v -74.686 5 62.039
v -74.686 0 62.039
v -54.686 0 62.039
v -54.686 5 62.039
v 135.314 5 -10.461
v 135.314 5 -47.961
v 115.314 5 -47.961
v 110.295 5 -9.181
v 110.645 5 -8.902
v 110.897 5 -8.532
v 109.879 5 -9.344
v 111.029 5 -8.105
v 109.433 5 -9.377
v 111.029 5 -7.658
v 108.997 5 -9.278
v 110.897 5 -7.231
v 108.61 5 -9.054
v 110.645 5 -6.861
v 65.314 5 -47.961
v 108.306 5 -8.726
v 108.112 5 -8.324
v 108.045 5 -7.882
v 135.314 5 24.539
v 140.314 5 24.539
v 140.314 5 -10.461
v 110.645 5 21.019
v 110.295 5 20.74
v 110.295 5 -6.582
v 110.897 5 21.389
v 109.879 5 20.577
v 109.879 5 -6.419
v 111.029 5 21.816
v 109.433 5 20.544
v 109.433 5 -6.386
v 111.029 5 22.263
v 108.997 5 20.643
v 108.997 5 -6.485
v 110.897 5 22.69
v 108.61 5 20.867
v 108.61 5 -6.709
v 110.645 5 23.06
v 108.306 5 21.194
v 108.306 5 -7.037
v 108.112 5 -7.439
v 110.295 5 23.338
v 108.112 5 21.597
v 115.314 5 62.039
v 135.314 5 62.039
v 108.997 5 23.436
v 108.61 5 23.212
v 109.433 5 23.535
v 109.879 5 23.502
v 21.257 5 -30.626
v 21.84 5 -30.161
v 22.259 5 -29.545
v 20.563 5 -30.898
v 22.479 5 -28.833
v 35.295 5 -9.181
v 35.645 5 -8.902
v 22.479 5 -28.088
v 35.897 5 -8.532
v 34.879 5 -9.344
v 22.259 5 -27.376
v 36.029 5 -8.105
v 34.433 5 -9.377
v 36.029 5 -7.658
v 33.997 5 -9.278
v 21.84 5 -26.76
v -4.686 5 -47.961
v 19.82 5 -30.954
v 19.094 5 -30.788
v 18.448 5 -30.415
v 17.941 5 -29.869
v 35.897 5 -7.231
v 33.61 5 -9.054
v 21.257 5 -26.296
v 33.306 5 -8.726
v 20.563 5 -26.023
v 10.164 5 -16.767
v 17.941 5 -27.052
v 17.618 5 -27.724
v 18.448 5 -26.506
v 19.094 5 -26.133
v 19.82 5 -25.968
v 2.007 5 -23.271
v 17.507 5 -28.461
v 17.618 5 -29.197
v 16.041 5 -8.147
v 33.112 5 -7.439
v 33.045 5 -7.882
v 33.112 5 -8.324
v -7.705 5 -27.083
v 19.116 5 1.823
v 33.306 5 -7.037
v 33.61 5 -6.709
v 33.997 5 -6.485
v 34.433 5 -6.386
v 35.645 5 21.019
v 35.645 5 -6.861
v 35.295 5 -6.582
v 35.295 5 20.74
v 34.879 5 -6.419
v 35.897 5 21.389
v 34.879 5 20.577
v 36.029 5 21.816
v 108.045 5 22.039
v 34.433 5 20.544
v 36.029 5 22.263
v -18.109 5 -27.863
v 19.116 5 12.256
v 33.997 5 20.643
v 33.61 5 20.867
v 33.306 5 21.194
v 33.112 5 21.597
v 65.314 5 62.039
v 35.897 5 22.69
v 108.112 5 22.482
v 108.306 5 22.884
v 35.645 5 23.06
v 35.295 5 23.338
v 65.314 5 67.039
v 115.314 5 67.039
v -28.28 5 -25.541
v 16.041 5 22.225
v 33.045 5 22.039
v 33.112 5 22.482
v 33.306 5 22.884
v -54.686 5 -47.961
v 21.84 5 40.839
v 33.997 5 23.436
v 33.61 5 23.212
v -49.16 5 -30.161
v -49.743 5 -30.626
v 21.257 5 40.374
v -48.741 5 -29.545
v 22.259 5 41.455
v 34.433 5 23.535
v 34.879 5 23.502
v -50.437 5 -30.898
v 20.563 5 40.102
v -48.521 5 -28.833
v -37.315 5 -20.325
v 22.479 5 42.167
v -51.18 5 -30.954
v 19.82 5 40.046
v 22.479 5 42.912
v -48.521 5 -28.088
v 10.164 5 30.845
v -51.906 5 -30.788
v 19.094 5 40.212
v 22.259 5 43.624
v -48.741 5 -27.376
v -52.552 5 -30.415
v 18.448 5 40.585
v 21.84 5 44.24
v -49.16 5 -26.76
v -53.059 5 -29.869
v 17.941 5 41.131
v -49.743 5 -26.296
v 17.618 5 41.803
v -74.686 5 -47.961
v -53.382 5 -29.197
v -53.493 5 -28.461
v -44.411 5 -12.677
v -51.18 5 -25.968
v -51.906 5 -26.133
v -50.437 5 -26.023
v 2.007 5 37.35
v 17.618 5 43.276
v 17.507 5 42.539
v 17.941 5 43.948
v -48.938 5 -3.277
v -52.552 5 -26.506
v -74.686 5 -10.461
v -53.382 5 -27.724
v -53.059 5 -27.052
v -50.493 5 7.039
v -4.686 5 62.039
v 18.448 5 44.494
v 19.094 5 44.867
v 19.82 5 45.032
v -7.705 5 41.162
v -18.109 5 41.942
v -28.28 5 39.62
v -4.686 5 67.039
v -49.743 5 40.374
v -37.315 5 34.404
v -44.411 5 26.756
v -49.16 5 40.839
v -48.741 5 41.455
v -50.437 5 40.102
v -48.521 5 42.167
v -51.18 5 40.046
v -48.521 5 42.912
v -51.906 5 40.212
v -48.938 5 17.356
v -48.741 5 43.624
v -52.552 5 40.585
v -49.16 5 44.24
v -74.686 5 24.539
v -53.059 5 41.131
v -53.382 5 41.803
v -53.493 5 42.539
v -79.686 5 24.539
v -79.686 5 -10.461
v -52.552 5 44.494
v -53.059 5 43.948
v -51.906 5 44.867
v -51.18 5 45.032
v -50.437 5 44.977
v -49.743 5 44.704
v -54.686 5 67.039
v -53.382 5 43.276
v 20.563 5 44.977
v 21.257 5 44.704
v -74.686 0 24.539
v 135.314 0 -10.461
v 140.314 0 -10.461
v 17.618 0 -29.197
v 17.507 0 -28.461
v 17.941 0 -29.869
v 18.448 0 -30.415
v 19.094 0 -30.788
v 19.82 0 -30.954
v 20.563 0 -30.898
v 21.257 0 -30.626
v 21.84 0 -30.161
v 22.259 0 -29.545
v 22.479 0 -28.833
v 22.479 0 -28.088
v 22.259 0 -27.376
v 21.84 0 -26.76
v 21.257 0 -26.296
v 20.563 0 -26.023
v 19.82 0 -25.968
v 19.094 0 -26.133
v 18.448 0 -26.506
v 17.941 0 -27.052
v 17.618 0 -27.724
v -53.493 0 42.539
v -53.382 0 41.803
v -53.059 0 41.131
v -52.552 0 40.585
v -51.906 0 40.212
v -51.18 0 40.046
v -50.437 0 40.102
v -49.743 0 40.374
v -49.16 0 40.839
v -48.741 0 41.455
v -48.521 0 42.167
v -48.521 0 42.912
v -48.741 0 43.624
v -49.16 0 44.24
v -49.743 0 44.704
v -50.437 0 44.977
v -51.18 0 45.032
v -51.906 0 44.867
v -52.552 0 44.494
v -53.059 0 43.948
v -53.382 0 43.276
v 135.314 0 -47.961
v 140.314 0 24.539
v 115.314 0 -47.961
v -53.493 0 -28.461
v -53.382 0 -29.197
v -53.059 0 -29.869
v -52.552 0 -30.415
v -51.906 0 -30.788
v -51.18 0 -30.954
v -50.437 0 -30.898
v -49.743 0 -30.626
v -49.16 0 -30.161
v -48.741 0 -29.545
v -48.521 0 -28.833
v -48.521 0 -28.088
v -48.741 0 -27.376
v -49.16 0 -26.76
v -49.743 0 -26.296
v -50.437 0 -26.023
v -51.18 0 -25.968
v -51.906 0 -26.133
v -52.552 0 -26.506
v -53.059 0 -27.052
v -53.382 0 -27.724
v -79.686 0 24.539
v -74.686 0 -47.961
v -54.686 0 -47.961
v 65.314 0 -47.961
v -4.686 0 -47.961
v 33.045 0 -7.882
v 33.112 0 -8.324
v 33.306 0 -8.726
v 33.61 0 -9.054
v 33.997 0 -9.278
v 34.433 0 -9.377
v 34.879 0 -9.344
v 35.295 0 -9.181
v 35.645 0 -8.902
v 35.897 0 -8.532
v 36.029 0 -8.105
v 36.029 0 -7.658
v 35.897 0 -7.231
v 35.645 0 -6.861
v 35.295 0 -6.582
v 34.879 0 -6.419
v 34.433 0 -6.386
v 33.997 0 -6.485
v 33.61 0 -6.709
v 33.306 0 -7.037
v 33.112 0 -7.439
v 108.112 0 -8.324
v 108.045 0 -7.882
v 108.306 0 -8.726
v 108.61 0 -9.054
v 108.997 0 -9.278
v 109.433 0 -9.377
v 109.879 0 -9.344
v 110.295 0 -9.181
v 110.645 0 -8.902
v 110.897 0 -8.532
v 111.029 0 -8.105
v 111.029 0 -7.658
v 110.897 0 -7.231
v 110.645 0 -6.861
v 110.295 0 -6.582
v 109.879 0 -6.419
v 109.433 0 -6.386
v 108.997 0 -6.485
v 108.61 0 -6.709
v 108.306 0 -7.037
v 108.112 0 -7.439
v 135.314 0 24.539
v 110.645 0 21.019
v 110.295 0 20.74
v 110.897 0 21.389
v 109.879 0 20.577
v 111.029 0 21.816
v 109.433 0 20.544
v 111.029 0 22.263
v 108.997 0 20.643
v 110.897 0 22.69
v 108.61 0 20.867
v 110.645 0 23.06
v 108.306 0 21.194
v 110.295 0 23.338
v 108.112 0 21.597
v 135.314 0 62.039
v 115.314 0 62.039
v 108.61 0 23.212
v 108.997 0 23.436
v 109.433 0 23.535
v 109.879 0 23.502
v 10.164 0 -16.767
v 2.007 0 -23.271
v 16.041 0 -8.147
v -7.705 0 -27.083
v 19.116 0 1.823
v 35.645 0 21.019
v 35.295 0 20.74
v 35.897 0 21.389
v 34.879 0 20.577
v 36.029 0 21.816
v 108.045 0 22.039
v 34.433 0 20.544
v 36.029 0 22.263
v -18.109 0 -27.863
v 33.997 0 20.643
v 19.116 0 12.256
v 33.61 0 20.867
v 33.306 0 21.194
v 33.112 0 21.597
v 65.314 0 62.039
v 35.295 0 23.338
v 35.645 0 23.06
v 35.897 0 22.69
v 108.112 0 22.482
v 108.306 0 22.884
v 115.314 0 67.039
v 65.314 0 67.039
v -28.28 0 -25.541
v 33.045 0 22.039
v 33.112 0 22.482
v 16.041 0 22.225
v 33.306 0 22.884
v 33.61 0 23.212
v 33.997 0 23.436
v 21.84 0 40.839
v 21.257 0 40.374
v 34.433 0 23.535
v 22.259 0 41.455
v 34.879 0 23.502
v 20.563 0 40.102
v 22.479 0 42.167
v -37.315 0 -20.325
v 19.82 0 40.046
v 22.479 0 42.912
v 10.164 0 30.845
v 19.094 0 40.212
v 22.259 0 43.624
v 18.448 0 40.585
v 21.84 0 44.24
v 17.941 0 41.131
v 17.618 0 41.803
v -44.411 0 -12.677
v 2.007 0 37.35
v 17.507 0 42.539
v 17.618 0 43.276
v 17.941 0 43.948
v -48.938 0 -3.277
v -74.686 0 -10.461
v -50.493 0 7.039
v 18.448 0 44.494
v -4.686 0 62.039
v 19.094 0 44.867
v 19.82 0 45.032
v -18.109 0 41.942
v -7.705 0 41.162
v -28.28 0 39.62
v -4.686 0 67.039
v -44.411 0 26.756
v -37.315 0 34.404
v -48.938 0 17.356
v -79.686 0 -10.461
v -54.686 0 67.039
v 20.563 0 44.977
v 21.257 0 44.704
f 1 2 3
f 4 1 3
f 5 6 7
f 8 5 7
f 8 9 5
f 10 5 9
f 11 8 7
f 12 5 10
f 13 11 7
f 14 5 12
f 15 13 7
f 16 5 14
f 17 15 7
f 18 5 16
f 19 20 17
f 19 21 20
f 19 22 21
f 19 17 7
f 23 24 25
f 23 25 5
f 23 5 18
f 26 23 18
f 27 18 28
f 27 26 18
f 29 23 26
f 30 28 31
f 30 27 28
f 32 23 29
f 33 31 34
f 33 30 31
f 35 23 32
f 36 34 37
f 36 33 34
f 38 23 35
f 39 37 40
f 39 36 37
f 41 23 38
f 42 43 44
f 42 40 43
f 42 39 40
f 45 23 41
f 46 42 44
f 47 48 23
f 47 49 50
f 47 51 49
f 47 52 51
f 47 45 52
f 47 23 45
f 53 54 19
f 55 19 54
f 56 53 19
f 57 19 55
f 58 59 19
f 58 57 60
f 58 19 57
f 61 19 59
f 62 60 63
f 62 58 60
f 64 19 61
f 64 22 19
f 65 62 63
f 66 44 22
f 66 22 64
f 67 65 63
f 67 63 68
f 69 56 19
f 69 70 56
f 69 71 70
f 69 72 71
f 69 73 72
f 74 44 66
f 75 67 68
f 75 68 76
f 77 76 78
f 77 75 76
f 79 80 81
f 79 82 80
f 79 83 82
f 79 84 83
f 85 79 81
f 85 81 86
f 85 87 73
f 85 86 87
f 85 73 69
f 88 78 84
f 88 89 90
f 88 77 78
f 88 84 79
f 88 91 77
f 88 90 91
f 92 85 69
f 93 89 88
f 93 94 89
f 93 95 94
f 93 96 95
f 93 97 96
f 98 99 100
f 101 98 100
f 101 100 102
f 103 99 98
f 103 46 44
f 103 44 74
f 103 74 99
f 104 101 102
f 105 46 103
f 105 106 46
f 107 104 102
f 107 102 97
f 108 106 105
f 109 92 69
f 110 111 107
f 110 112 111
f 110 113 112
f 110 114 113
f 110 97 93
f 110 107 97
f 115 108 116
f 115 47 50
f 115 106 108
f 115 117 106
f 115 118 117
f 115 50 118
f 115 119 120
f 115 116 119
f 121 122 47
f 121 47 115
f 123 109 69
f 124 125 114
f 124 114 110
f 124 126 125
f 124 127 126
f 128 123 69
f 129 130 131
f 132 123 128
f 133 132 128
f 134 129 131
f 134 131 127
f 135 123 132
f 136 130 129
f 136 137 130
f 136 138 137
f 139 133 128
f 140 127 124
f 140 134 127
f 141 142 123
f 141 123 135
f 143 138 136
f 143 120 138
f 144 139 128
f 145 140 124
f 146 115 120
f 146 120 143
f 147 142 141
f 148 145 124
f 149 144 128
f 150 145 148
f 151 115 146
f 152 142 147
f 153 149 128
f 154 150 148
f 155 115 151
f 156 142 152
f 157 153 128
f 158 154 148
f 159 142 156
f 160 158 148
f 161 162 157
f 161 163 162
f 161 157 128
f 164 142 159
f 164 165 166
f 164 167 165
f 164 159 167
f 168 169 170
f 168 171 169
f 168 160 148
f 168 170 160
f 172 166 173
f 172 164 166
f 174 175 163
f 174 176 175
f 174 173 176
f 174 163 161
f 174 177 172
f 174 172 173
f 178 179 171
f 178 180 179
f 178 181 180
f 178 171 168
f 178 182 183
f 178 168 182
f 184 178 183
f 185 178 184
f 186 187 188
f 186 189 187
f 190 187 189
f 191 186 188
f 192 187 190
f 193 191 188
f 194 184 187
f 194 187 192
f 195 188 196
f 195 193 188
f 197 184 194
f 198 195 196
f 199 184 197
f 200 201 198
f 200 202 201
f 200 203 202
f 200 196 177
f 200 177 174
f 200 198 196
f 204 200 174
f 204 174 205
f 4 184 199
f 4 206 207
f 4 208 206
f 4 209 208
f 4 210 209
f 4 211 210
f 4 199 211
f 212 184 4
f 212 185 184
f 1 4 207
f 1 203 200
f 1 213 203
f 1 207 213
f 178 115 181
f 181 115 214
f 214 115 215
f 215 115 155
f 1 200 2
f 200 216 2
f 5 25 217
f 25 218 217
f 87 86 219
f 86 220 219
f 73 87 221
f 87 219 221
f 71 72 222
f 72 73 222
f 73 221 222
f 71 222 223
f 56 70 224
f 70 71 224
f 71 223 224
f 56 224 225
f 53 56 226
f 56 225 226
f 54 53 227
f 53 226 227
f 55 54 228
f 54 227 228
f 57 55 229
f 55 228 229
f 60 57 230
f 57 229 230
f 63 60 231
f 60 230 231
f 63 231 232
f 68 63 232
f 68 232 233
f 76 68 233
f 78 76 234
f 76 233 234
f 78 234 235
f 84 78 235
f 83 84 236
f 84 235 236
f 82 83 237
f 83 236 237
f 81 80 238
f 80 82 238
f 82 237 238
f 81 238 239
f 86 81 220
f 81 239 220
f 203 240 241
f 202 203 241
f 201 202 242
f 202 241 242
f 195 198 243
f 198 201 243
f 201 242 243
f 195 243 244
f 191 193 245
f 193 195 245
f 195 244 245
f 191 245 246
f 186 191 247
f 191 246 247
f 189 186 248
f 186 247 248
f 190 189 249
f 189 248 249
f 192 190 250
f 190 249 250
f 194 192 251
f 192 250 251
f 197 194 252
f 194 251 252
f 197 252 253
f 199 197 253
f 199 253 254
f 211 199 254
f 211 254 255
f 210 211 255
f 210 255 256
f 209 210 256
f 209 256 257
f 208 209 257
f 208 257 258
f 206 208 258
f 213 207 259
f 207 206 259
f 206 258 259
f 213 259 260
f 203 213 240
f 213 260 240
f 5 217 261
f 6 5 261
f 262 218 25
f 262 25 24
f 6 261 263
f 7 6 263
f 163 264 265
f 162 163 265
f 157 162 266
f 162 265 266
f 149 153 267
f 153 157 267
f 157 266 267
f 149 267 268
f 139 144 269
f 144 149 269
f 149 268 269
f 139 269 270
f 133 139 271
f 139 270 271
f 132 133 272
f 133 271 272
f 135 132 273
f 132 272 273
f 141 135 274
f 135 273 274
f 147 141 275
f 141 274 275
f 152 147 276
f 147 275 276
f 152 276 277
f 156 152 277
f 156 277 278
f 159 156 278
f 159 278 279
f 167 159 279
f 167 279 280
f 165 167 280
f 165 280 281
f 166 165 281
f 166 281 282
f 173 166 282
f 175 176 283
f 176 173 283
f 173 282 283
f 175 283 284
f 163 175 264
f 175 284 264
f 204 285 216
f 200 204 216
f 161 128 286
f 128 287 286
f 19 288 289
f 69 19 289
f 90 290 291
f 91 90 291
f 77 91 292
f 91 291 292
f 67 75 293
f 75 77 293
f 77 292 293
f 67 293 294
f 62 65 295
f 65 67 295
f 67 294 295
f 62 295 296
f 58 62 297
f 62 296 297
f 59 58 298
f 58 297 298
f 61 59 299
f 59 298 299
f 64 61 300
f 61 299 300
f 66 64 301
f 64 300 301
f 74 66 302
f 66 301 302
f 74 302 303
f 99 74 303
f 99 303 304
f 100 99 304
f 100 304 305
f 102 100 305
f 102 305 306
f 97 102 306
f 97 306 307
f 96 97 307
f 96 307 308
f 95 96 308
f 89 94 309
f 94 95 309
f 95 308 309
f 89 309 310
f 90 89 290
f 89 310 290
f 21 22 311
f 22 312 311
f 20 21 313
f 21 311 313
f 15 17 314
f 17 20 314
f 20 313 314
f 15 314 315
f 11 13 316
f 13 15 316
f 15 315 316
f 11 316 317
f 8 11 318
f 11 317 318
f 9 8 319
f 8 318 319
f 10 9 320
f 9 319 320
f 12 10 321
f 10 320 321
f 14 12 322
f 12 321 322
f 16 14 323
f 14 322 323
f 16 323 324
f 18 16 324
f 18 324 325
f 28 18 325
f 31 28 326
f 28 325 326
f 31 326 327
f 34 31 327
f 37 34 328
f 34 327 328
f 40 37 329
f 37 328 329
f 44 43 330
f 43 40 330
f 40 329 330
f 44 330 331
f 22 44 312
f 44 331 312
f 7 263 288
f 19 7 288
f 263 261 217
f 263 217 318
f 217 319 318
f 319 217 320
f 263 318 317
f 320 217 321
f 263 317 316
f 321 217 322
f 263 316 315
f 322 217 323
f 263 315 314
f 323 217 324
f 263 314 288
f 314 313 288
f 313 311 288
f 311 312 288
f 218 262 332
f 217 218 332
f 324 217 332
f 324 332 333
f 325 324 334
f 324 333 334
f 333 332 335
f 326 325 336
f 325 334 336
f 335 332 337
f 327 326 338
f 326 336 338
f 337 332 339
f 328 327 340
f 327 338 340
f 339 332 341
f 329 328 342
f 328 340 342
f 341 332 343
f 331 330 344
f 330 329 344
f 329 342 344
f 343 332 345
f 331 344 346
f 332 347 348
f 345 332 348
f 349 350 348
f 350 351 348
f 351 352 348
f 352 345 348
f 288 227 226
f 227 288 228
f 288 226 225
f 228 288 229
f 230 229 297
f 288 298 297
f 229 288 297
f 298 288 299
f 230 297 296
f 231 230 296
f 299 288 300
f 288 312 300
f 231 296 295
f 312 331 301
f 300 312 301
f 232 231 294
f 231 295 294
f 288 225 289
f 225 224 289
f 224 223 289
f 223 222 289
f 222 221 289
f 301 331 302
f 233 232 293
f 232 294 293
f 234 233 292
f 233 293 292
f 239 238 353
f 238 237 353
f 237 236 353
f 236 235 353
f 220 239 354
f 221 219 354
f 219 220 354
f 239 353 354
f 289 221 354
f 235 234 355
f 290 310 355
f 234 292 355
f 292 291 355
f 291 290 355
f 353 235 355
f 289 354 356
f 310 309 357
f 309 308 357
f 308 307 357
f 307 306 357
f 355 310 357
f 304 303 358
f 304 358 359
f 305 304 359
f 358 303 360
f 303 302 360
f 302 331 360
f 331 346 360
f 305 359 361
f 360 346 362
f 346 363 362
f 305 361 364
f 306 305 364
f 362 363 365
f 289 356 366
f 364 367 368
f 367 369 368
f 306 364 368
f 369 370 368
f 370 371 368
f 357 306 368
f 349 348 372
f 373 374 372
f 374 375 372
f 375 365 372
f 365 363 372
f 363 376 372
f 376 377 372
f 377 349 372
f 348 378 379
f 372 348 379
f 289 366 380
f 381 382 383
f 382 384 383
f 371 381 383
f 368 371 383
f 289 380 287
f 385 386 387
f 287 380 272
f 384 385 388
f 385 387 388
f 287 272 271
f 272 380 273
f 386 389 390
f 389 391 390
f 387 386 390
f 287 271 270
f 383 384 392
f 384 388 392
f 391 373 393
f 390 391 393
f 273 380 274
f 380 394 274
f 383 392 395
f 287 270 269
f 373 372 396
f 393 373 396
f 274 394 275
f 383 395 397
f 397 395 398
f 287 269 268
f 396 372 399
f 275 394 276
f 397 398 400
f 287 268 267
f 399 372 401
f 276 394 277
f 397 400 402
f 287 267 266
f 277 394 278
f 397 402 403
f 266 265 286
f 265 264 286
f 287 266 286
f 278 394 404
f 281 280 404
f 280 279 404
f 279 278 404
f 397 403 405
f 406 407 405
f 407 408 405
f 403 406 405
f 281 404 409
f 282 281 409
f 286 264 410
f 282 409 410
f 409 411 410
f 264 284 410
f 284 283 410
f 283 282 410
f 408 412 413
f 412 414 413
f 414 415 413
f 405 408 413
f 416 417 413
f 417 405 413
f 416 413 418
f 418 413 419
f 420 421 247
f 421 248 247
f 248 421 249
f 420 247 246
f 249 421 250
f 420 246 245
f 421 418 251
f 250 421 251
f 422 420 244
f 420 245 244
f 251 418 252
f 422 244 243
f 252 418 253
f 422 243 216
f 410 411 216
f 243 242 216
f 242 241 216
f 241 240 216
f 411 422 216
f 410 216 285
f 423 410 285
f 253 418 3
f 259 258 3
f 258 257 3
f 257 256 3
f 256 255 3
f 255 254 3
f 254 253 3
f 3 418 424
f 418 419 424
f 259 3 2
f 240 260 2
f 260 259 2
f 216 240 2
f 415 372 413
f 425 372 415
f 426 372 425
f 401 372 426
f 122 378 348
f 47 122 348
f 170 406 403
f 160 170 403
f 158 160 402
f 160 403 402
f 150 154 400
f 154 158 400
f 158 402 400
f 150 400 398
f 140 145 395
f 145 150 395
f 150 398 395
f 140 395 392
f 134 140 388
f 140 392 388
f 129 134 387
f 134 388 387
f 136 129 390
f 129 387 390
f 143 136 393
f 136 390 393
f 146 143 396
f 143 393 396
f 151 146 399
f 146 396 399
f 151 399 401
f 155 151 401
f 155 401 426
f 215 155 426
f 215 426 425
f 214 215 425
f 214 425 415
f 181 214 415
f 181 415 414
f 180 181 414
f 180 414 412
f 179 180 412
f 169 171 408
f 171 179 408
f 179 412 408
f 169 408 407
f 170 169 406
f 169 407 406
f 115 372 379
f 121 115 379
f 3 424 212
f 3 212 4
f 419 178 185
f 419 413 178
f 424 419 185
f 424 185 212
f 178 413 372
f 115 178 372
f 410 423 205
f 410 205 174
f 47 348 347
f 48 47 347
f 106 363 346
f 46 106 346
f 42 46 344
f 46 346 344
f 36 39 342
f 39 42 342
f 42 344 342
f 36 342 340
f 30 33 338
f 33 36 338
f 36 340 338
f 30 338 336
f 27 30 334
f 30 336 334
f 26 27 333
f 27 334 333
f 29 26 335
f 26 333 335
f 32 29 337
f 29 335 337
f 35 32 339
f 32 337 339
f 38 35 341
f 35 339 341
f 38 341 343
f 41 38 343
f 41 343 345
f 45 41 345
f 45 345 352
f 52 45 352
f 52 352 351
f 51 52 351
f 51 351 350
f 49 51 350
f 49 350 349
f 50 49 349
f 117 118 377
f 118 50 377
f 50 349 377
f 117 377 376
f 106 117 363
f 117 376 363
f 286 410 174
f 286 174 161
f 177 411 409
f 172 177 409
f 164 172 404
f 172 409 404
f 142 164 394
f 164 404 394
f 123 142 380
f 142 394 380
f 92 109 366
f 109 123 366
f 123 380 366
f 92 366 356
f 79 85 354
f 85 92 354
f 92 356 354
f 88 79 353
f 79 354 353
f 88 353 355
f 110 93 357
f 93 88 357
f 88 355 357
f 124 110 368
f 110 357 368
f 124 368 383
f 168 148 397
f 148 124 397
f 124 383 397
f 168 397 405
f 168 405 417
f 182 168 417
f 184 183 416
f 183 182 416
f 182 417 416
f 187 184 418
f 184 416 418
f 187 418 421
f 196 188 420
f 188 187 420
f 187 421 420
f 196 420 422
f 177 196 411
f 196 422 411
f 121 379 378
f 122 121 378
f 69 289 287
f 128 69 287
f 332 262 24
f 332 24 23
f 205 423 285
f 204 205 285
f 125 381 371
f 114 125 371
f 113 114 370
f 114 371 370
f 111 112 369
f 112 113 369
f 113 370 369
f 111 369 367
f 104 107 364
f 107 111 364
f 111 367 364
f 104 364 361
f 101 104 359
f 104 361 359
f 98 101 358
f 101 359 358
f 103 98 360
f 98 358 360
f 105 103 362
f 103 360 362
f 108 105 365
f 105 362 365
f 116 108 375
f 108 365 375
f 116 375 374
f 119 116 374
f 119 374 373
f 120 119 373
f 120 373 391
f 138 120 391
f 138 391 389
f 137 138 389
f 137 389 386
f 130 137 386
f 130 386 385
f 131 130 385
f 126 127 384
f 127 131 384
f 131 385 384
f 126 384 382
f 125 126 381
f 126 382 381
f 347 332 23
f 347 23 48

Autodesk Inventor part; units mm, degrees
ref_plane "YZ Plane" through (0, 0, 0) normal (1, 0, 0) x (0, 1, 0)
ref_plane "XZ Plane" through (0, 0, 0) normal (0, 1, 0) x (-1, 0, 0)
ref_plane "XY Plane" through (0, 0, 0) normal (0, 0, 1) x (1, 0, 0)
sketch "Sketch1" plane through (0, 0, 0) normal (0, 1, 0) x (-1, 0, 0)
  line L0 (4.6863, 62.0394) -> (4.6863, 67.0394)
  line L1 (4.6863, 67.0394) -> (54.6863, 67.0394)
  line L2 (54.6863, 67.0394) -> (54.6863, 62.0394)
  line L3 (74.6863, 62.0394) -> (54.6863, 62.0394)
  line L4 (-65.3137, 62.0394) -> (-65.3137, 67.0394)
  line L5 (-65.3137, 67.0394) -> (-115.3137, 67.0394)
  line L6 (-115.3137, 67.0394) -> (-115.3137, 62.0394)
  line L7 (4.6863, 62.0394) -> (-65.3137, 62.0394)
  line L8 (-115.3137, 62.0394) -> (-135.3137, 62.0394)
  circle A0 centre (15.4931, 7.0394) radius 35
  line L9 (-135.3137, -47.9606) -> (-115.3137, -47.9606)
  line L10 (-65.3137, -47.9606) -> (4.6863, -47.9606)
  line L11 (54.6863, -47.9606) -> (74.6863, -47.9606)
  line L12 (79.6863, -10.4606) -> (74.6863, -10.4606)
  line L13 (74.6863, -10.4606) -> (74.6863, -47.9606)
  line L14 (79.6863, -10.4606) -> (79.6863, 24.5394)
  line L15 (79.6863, 24.5394) -> (74.6863, 24.5394)
  line L16 (74.6863, 24.5394) -> (74.6863, 62.0394)
  line L17 (-140.3137, -10.4606) -> (-140.3137, 24.5394)
  line L18 (-140.3137, -10.4606) -> (-135.3137, -10.4606)
  line L19 (-135.3137, -10.4606) -> (-135.3137, -47.9606)
  line L20 (-140.3137, 24.5394) -> (-135.3137, 24.5394)
  line L21 (-135.3137, 24.5394) -> (-135.3137, 62.0394)
  line L22 (-115.3137, -47.9606) -> (54.6863, -47.9606)
  circle A1 centre (50.9931, -28.4606) radius 2.5
  circle A2 centre (-20.0069, -28.4606) radius 2.5
  circle A3 centre (-20.0069, 42.5394) radius 2.5
  circle A4 centre (50.9931, 42.5394) radius 2.5
  line L23 (-112.0454, -9.184) -> (-112.0454, -9.084)
  circle A5 centre (-109.5454, -7.8815) radius 1.5
  circle A6 centre (-109.5454, 22.0394) radius 1.5
  circle A7 centre (-34.5454, 22.0394) radius 1.5
  circle A8 centre (-34.5454, -7.8815) radius 1.5
  point P0 (0, 0)
  dimension "d6" = 50
  dimension "d7" = 5
  dimension "d9" = 50
  dimension "d10" = 5
  dimension "d12" = 70
  dimension "d13" = 50
  dimension "d29" = 70
  dimension "d44" = 5
  dimension "d45" = 5
  dimension "d46" = 5
  dimension "d47" = 5
  dimension "d57" = 3
  dimension "d60" = 3
  dimension "d63" = 3
  dimension "d64" = 3
extrude "Extrusion4" add sketch "Sketch1" along normal blind 5
properties part number "Part Sisi 1"
